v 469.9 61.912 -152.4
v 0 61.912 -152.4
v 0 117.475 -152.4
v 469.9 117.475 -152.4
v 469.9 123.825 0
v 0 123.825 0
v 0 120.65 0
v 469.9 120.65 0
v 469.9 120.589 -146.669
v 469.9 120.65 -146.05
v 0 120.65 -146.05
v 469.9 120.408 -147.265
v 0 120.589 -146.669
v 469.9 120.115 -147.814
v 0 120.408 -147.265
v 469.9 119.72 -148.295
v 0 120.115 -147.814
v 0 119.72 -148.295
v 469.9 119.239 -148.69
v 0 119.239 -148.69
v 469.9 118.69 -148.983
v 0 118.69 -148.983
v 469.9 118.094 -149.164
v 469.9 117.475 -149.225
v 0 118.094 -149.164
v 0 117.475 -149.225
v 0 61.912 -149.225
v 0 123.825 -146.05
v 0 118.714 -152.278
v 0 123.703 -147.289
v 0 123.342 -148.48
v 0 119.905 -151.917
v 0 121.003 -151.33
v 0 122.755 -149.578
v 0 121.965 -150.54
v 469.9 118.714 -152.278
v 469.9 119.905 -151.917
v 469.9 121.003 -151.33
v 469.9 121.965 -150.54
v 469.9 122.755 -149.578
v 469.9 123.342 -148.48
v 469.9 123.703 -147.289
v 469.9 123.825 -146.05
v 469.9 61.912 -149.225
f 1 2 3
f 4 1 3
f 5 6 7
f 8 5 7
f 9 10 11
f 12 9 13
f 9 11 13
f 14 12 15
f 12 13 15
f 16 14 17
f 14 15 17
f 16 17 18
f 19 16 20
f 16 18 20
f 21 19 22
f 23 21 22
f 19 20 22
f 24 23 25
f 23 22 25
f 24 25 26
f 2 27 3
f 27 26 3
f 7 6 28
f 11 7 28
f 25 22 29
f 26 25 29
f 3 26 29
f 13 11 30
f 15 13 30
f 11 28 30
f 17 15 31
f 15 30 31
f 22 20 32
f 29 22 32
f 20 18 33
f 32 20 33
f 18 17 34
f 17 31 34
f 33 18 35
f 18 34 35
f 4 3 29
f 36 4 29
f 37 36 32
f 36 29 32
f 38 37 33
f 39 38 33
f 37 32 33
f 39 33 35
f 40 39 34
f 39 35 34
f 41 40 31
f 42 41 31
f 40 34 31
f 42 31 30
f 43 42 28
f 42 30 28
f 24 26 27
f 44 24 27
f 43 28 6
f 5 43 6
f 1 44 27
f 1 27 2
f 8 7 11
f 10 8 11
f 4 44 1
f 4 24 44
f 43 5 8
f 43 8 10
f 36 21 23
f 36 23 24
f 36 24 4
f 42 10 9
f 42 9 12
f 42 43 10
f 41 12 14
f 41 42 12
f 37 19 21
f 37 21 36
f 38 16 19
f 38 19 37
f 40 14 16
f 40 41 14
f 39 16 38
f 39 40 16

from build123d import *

# Parameters (mm, degrees)
BASE_FLANGE1_DEPTH = 469.9
SKETCH10_W         = 152.4
SKETCH10_H         = 61.9125
CUT_EXTRUDE5_DEPTH = 510.278313523


# Sheet-metal steps are written as plain solids
with BuildPart() as part:
    # Sketch1 → Base-Flange1 (new body)
    with BuildSketch(Plane(origin=(0, 0, 0), x_dir=(0, 0, -1), z_dir=(1, 0, 0))):
        with BuildLine():
            Line((0, 0), (146.05, 0))
            ThreePointArc((146.05, 0), (150.540128061, 1.859871939), (152.4, 6.35))
            Line((152.4, 6.35), (152.4, 117.475))
            ThreePointArc((152.4, 117.475), (150.540128061, 121.965128061), (146.05, 123.825))
            Line((146.05, 123.825), (0, 123.825))
            Line((0, 123.825), (0, 120.65))
            Line((0, 120.65), (146.05, 120.65))
            ThreePointArc((146.05, 120.65), (148.29506403, 119.72006403), (149.225, 117.475))
            Line((149.225, 117.475), (149.225, 6.35))
            ThreePointArc((149.225, 6.35), (148.29506403, 4.10493597), (146.05, 3.175))
            Line((146.05, 3.175), (0, 3.175))
            Line((0, 3.175), (0, 0))
        make_face()
    extrude(amount=BASE_FLANGE1_DEPTH)

    # Sketch10 → Cut-Extrude5 (cut, through all)
    with BuildSketch(Plane(origin=(469.9, 0, 0), x_dir=(0, 0, -1), z_dir=(1, 0, 0))):
        with Locations((76.2, 30.95625)):
            Rectangle(SKETCH10_W, SKETCH10_H)
    extrude(amount=-CUT_EXTRUDE5_DEPTH, mode=Mode.SUBTRACT)


solid = part.part
